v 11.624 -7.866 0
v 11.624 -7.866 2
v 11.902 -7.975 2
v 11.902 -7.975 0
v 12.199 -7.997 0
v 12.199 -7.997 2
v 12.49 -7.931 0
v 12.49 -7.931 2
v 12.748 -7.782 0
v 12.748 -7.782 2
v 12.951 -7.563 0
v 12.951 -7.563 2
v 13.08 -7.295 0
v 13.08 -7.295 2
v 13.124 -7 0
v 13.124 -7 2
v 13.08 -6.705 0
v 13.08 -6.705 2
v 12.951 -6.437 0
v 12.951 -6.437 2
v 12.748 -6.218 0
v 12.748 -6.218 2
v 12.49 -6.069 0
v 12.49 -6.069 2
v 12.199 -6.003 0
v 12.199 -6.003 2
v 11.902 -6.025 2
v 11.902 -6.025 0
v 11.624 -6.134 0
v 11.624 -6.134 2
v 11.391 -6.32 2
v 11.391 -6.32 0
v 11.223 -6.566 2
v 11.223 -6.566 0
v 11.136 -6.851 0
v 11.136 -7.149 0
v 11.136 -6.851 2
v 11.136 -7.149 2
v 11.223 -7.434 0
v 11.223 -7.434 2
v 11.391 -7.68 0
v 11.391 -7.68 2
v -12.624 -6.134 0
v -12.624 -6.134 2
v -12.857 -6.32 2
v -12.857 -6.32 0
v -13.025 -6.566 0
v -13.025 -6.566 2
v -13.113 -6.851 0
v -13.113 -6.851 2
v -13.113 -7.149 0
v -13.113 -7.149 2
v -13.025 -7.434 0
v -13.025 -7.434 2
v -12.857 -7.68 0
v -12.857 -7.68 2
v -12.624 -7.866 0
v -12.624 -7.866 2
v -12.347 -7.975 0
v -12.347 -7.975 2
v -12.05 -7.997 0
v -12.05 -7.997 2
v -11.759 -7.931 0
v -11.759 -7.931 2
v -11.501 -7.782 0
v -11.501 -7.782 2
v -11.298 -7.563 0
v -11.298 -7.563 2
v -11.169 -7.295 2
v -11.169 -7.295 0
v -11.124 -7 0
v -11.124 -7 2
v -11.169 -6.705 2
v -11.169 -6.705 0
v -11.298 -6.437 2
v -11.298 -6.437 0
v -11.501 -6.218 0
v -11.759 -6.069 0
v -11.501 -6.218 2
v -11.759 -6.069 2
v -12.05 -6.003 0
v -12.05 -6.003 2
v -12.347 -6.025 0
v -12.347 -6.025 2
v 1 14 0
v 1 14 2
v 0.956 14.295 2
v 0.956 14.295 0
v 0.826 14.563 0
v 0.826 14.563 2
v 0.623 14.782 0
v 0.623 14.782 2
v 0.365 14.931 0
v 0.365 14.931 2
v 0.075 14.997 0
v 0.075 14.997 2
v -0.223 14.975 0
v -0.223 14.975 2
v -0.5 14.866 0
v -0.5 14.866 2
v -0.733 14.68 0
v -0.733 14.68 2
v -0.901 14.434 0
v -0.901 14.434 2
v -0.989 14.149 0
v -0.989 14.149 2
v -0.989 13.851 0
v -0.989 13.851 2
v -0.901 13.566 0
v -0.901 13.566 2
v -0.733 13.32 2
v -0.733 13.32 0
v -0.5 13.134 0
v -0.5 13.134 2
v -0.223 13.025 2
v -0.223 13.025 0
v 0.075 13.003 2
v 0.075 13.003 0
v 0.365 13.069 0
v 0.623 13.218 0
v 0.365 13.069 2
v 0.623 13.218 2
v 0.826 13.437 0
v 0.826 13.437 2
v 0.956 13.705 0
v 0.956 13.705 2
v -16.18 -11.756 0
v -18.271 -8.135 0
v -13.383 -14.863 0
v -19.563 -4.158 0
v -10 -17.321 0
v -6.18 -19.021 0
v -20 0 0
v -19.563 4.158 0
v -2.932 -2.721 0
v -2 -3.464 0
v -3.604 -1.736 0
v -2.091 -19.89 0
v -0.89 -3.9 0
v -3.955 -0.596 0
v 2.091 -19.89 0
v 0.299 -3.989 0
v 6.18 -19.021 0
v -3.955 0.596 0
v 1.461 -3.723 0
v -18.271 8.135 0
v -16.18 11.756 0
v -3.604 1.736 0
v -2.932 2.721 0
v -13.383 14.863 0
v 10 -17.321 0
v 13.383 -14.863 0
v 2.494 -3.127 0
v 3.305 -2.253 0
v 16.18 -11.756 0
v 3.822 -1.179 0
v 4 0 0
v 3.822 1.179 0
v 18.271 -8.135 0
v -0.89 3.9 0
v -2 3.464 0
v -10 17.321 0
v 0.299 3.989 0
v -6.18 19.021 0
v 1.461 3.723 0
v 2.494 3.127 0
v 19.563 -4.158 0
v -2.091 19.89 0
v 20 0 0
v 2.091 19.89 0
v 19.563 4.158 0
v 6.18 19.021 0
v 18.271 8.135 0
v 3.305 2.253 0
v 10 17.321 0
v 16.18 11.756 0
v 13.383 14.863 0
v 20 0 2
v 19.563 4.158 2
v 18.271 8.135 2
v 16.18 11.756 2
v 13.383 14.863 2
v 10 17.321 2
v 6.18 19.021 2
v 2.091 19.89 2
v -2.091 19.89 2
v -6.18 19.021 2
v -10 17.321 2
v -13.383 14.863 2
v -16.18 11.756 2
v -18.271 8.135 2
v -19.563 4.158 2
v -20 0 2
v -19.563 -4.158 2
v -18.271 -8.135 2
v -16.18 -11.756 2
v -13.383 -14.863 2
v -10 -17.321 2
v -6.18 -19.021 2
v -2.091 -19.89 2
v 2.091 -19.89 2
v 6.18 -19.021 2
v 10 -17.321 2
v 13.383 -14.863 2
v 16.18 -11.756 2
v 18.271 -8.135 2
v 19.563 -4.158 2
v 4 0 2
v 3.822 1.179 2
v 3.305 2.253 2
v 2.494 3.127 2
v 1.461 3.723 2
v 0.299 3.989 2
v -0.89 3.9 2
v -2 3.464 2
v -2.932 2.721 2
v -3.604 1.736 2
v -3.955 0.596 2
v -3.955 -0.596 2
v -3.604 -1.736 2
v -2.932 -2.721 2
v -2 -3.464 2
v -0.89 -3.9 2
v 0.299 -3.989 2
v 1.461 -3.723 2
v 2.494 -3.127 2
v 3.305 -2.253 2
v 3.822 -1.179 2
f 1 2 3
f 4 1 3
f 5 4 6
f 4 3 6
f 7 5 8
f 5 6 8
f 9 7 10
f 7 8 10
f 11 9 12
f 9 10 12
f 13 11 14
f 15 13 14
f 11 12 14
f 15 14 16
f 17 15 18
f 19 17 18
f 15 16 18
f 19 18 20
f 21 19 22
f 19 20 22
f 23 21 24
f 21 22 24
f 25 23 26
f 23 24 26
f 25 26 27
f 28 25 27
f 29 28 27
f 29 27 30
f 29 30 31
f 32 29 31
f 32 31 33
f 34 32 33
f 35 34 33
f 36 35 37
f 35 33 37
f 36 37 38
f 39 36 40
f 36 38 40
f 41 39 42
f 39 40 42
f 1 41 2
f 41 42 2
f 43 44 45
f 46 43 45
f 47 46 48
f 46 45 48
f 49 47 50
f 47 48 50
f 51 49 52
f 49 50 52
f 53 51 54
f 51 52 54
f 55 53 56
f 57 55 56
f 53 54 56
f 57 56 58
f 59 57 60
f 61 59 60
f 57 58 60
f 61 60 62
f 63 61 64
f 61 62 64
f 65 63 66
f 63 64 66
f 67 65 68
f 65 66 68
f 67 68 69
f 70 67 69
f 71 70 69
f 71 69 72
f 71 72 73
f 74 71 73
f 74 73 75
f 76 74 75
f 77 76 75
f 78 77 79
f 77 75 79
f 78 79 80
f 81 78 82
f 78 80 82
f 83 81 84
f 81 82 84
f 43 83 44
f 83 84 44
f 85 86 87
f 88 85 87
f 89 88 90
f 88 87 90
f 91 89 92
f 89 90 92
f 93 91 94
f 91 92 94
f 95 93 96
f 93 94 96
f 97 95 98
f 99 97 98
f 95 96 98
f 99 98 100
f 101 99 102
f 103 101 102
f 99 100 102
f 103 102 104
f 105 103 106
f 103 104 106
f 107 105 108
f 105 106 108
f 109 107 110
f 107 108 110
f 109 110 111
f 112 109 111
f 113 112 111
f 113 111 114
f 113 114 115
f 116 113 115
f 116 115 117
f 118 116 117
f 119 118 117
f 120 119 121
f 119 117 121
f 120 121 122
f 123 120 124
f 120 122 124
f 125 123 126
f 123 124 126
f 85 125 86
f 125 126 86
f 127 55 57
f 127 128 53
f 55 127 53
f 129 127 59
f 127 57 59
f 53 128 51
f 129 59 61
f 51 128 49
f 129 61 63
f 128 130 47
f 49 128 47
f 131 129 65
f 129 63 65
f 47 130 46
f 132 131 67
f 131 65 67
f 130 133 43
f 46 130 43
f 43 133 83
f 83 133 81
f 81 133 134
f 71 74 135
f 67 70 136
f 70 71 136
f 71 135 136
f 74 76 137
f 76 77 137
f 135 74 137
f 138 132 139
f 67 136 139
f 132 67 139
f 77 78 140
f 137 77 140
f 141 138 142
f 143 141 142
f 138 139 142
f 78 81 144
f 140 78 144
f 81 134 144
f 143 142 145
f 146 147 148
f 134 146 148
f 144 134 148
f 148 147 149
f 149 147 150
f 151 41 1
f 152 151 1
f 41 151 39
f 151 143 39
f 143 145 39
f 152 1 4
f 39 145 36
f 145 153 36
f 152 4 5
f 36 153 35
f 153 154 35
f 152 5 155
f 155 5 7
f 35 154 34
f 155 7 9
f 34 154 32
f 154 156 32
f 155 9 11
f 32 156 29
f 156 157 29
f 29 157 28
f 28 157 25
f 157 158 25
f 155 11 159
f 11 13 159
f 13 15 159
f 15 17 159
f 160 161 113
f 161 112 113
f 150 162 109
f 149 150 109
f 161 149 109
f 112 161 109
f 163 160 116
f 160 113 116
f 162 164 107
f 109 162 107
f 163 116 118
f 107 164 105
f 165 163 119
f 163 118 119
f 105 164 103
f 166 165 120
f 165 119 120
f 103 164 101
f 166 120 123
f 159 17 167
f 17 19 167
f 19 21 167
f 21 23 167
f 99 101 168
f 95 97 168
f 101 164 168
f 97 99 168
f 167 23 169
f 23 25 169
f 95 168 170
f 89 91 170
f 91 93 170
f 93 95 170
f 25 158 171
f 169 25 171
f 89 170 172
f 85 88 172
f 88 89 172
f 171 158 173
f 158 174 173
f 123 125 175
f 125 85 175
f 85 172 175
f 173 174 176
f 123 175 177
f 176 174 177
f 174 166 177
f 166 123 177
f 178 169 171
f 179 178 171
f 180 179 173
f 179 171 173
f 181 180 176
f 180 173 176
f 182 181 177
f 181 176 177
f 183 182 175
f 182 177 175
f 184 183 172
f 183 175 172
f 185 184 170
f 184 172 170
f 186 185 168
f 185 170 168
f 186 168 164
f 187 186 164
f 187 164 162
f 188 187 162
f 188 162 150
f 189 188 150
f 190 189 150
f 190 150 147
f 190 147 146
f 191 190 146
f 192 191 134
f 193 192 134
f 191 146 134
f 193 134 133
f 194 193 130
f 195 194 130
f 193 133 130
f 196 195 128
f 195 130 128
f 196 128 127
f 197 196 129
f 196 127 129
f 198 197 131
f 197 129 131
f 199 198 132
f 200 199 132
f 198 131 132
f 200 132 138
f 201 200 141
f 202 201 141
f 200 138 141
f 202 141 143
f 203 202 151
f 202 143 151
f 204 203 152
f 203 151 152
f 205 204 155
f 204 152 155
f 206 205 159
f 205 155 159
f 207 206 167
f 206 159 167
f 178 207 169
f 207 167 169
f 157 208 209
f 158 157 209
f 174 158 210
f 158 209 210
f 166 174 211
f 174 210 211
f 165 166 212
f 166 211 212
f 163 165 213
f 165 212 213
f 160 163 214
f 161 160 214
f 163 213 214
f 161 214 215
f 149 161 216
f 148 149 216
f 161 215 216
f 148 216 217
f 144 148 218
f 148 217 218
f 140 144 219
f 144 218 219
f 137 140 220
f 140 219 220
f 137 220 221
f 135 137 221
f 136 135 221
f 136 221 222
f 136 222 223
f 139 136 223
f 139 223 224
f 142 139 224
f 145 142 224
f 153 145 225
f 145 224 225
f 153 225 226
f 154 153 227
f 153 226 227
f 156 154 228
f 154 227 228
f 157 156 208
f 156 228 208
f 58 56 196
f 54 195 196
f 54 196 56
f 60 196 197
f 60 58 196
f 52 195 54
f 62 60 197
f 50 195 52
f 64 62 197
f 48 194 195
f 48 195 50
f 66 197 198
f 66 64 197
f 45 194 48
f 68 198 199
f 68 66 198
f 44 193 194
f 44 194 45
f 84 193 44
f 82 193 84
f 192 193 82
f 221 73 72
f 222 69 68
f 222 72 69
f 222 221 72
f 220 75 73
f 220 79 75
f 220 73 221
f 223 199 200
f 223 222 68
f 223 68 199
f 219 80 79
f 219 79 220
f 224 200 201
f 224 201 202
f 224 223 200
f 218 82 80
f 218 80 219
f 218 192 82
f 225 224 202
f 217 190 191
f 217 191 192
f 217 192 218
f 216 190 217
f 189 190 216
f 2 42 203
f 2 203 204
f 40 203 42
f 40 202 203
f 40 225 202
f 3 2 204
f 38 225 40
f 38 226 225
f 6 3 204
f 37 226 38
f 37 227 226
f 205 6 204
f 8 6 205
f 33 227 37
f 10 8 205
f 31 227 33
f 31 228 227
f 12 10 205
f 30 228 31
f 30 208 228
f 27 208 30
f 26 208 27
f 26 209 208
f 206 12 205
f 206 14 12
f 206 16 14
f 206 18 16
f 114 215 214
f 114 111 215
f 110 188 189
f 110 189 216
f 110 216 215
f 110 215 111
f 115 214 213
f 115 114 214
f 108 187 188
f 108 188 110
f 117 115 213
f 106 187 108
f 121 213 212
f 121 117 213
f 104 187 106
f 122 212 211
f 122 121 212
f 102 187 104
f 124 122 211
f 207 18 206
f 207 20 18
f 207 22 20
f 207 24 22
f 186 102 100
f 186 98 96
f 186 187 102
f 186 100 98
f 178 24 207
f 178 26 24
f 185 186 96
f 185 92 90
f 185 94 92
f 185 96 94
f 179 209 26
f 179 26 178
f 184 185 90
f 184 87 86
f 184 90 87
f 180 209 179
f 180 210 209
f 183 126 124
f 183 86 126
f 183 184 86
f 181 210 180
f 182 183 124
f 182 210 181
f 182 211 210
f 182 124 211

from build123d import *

# Parameters (mm, degrees)
SKETCH_1_R               = 20
EXTRUDE_1_DEPTH          = 2
SKETCH_2_R               = 1
CUT_EXTRUDE_1_DEPTH      = 2
PATTERN_CIRCULAR_1_COUNT = 3
SKETCH_3_R               = 4
CUT_EXTRUDE_2_DEPTH      = 2


with BuildPart() as part:
    # 草图1 → 凸台-拉伸1 (new body)
    with BuildSketch(Plane.XY):
        Circle(SKETCH_1_R)
    extrude(amount=EXTRUDE_1_DEPTH)

    # 草图2 → 切除-拉伸1 (cut)
    with BuildSketch(Plane.XY.offset(2)):
        with Locations((0, 14)):
            Circle(SKETCH_2_R)
    cut_extrude_1 = extrude(amount=-CUT_EXTRUDE_1_DEPTH, mode=Mode.SUBTRACT)

    # 阵列(圆周)1: 切除-拉伸1 ×3 about axis
    pattern_circular_1_axis = Axis((0, 0, 0), (0, 0, 1))
    for i in range(1, PATTERN_CIRCULAR_1_COUNT):
        add(cut_extrude_1.rotate(pattern_circular_1_axis, i * 360 / PATTERN_CIRCULAR_1_COUNT), mode=Mode.SUBTRACT)

    # 草图3 → 切除-拉伸2 (cut)
    with BuildSketch(Plane.XY.offset(2)):
        Circle(SKETCH_3_R)
    extrude(amount=-CUT_EXTRUDE_2_DEPTH, mode=Mode.SUBTRACT)


solid = part.part
